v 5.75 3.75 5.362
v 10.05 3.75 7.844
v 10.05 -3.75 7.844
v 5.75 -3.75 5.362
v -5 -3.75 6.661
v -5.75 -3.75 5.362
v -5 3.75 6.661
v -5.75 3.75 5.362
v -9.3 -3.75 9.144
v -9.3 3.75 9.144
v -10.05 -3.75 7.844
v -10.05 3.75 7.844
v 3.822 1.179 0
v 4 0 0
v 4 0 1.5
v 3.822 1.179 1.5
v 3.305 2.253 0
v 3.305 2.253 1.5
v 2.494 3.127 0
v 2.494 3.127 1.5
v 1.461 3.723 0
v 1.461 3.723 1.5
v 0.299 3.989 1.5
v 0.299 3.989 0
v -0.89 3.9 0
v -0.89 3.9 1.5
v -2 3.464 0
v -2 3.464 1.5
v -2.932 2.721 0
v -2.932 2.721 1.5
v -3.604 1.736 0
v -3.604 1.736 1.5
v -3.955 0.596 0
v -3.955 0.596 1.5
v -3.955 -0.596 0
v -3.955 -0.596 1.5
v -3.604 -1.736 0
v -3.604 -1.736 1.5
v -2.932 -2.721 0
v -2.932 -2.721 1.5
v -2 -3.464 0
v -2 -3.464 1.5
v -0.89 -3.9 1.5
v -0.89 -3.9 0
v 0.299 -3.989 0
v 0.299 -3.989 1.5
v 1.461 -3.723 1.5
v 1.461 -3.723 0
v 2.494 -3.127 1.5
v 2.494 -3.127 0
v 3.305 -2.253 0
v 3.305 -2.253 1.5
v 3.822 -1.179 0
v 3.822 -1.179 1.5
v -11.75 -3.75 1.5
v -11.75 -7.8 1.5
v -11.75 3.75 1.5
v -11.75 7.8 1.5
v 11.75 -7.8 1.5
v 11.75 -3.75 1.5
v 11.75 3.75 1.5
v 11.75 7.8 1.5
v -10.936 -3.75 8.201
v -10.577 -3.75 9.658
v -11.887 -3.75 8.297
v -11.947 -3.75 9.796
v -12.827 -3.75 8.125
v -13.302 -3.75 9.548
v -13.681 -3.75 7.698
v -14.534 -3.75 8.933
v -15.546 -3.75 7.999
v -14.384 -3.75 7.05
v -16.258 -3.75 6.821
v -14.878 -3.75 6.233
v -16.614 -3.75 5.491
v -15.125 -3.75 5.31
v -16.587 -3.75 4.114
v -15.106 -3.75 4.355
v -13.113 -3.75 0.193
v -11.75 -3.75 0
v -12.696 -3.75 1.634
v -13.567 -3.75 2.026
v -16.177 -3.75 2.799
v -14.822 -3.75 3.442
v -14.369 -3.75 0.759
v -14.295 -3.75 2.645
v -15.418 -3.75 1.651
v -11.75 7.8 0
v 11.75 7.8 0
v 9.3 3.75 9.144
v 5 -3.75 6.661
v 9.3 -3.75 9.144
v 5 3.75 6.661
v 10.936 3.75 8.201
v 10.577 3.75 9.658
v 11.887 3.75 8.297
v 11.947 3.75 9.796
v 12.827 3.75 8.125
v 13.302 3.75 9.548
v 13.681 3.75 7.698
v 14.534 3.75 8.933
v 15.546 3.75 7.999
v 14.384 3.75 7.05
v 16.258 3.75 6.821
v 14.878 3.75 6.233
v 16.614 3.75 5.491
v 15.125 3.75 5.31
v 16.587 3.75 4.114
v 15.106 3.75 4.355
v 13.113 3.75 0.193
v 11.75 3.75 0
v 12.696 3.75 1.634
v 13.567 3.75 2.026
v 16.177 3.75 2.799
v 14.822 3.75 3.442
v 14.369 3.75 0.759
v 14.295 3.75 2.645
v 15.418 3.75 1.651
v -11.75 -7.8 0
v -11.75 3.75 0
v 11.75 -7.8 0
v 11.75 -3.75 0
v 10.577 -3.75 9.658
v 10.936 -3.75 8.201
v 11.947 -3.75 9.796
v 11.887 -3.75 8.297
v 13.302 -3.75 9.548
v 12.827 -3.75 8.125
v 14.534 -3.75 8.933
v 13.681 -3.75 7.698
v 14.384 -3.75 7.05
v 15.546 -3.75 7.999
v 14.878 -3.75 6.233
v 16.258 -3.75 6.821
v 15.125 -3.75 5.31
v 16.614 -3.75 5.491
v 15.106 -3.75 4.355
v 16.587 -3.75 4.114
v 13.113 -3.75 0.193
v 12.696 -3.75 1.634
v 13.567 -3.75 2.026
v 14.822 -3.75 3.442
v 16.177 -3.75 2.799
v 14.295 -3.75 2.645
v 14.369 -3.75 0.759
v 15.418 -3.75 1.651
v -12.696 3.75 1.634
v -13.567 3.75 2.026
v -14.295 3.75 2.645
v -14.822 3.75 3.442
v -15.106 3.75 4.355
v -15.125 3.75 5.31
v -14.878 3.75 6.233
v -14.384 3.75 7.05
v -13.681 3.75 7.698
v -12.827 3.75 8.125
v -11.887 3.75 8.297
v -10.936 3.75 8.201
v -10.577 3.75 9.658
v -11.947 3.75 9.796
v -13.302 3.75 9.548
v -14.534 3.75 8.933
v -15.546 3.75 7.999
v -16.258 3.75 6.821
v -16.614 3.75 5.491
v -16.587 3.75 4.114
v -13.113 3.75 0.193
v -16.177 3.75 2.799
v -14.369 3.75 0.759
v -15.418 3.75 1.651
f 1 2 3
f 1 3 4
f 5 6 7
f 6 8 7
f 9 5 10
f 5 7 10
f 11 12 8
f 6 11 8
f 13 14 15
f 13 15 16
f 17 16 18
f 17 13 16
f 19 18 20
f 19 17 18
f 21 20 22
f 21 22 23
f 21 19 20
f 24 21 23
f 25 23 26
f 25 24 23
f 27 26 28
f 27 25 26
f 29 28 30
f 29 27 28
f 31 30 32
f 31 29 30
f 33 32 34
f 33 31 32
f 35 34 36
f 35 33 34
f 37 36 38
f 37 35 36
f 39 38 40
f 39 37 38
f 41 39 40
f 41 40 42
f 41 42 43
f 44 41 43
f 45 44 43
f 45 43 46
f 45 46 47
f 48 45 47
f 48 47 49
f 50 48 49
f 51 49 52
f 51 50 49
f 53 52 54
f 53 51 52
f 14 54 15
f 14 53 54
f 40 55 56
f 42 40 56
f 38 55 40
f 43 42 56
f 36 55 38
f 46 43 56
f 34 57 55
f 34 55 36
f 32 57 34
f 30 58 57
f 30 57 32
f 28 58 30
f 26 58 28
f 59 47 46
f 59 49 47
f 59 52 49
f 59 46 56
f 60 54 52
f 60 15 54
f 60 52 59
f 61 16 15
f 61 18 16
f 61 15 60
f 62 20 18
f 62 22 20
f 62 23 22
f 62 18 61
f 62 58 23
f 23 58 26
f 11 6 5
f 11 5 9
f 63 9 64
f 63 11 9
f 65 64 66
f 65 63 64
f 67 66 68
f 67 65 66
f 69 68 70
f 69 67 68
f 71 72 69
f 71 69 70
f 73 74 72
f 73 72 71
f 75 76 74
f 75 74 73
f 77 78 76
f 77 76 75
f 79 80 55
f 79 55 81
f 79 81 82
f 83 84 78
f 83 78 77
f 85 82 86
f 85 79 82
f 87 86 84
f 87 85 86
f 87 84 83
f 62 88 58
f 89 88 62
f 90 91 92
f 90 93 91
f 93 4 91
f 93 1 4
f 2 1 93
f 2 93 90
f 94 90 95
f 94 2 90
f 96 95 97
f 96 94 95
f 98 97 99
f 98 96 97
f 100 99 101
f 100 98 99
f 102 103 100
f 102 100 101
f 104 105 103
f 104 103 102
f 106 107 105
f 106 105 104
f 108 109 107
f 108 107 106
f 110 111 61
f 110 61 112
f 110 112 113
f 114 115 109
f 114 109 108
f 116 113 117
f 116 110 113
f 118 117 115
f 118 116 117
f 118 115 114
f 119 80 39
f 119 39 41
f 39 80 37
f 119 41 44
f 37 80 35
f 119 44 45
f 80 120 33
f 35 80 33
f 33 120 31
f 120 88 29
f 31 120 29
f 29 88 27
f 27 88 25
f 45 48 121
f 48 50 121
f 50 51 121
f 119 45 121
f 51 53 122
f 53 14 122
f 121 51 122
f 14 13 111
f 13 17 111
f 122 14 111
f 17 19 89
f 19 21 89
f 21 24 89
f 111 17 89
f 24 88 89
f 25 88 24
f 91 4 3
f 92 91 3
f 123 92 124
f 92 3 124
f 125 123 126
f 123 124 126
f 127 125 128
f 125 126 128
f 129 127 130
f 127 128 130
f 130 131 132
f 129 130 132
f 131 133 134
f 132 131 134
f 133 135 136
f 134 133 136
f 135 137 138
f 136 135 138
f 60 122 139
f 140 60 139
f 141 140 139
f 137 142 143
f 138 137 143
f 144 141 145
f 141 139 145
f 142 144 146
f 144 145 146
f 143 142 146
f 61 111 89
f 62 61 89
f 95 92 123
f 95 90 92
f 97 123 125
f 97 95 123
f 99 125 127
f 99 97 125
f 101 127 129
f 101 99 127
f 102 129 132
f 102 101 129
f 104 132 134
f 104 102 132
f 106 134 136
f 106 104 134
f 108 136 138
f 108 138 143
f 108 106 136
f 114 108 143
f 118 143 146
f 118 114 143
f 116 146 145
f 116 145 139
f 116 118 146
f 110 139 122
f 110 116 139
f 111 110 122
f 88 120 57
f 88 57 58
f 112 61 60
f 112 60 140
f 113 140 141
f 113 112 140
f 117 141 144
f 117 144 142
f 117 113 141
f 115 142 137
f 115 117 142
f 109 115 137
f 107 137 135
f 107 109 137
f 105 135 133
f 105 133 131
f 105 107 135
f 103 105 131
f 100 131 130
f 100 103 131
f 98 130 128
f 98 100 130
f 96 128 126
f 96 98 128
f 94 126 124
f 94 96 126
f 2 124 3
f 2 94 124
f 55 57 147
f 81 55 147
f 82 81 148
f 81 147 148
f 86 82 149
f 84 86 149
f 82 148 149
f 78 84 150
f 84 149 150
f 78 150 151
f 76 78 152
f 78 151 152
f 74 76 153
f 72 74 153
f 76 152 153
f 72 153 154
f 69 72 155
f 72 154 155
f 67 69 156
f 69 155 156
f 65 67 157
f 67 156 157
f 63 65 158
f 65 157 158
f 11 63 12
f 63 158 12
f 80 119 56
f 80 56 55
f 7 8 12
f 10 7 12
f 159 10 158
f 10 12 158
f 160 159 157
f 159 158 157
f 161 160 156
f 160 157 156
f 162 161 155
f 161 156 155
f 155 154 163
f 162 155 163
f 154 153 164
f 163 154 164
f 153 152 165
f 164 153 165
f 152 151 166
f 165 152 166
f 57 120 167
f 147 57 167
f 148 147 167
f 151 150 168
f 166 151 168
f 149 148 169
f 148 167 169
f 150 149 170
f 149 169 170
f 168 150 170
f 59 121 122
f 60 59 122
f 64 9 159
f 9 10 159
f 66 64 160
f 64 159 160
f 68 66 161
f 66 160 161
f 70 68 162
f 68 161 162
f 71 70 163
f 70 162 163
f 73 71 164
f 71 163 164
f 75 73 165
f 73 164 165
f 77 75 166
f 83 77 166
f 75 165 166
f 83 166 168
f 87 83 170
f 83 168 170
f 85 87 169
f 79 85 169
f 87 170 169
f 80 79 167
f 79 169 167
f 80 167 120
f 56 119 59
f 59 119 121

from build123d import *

# Parameters (mm, degrees)
SKETCH_1_W      = 23.5
SKETCH_1_H      = 15.6
SKETCH_1_R      = 4
EXTRUDE_1_DEPTH = 1.5
EXTRUDE_2_DEPTH = 3.75


with BuildPart() as part:
    # Эскиз1 → Бобышка-Вытянуть1 (new body)
    with BuildSketch(Plane.XY):
        Rectangle(SKETCH_1_W, SKETCH_1_H)
        Circle(SKETCH_1_R, mode=Mode.SUBTRACT)
    extrude(amount=EXTRUDE_1_DEPTH)

    # Эскиз3 → Бобышка-Вытянуть2 (add, symmetric)
    with BuildSketch(Plane(origin=(0, 0, 0), x_dir=(1, 0, 0), z_dir=(0, 1, 0))):
        with BuildLine():
            Line((-10.05, -7.844486373), (-5.75, -5.361880215))
            Line((-5.75, -5.361880215), (-5, -6.660918321))
            Line((-5, -6.660918321), (-9.3, -9.143524479))
            ThreePointArc((-9.3, -9.143524479), (-16.483036549, -6.168213321), (-11.75, 0))
            Line((-11.75, 0), (-11.75, -1.5))
            ThreePointArc((-11.75, -1.5), (-15.034147809, -5.779984753), (-10.05, -7.844486373))
        make_face()
    extrude_2 = extrude(amount=EXTRUDE_2_DEPTH, both=True)

    # Зеркальное отражение1: Бобышка-Вытянуть2 across plane
    add(extrude_2.mirror(Plane(origin=(0, 0, 0), x_dir=(0, 0, 1), z_dir=(1, 0, 0))))


solid = part.part
